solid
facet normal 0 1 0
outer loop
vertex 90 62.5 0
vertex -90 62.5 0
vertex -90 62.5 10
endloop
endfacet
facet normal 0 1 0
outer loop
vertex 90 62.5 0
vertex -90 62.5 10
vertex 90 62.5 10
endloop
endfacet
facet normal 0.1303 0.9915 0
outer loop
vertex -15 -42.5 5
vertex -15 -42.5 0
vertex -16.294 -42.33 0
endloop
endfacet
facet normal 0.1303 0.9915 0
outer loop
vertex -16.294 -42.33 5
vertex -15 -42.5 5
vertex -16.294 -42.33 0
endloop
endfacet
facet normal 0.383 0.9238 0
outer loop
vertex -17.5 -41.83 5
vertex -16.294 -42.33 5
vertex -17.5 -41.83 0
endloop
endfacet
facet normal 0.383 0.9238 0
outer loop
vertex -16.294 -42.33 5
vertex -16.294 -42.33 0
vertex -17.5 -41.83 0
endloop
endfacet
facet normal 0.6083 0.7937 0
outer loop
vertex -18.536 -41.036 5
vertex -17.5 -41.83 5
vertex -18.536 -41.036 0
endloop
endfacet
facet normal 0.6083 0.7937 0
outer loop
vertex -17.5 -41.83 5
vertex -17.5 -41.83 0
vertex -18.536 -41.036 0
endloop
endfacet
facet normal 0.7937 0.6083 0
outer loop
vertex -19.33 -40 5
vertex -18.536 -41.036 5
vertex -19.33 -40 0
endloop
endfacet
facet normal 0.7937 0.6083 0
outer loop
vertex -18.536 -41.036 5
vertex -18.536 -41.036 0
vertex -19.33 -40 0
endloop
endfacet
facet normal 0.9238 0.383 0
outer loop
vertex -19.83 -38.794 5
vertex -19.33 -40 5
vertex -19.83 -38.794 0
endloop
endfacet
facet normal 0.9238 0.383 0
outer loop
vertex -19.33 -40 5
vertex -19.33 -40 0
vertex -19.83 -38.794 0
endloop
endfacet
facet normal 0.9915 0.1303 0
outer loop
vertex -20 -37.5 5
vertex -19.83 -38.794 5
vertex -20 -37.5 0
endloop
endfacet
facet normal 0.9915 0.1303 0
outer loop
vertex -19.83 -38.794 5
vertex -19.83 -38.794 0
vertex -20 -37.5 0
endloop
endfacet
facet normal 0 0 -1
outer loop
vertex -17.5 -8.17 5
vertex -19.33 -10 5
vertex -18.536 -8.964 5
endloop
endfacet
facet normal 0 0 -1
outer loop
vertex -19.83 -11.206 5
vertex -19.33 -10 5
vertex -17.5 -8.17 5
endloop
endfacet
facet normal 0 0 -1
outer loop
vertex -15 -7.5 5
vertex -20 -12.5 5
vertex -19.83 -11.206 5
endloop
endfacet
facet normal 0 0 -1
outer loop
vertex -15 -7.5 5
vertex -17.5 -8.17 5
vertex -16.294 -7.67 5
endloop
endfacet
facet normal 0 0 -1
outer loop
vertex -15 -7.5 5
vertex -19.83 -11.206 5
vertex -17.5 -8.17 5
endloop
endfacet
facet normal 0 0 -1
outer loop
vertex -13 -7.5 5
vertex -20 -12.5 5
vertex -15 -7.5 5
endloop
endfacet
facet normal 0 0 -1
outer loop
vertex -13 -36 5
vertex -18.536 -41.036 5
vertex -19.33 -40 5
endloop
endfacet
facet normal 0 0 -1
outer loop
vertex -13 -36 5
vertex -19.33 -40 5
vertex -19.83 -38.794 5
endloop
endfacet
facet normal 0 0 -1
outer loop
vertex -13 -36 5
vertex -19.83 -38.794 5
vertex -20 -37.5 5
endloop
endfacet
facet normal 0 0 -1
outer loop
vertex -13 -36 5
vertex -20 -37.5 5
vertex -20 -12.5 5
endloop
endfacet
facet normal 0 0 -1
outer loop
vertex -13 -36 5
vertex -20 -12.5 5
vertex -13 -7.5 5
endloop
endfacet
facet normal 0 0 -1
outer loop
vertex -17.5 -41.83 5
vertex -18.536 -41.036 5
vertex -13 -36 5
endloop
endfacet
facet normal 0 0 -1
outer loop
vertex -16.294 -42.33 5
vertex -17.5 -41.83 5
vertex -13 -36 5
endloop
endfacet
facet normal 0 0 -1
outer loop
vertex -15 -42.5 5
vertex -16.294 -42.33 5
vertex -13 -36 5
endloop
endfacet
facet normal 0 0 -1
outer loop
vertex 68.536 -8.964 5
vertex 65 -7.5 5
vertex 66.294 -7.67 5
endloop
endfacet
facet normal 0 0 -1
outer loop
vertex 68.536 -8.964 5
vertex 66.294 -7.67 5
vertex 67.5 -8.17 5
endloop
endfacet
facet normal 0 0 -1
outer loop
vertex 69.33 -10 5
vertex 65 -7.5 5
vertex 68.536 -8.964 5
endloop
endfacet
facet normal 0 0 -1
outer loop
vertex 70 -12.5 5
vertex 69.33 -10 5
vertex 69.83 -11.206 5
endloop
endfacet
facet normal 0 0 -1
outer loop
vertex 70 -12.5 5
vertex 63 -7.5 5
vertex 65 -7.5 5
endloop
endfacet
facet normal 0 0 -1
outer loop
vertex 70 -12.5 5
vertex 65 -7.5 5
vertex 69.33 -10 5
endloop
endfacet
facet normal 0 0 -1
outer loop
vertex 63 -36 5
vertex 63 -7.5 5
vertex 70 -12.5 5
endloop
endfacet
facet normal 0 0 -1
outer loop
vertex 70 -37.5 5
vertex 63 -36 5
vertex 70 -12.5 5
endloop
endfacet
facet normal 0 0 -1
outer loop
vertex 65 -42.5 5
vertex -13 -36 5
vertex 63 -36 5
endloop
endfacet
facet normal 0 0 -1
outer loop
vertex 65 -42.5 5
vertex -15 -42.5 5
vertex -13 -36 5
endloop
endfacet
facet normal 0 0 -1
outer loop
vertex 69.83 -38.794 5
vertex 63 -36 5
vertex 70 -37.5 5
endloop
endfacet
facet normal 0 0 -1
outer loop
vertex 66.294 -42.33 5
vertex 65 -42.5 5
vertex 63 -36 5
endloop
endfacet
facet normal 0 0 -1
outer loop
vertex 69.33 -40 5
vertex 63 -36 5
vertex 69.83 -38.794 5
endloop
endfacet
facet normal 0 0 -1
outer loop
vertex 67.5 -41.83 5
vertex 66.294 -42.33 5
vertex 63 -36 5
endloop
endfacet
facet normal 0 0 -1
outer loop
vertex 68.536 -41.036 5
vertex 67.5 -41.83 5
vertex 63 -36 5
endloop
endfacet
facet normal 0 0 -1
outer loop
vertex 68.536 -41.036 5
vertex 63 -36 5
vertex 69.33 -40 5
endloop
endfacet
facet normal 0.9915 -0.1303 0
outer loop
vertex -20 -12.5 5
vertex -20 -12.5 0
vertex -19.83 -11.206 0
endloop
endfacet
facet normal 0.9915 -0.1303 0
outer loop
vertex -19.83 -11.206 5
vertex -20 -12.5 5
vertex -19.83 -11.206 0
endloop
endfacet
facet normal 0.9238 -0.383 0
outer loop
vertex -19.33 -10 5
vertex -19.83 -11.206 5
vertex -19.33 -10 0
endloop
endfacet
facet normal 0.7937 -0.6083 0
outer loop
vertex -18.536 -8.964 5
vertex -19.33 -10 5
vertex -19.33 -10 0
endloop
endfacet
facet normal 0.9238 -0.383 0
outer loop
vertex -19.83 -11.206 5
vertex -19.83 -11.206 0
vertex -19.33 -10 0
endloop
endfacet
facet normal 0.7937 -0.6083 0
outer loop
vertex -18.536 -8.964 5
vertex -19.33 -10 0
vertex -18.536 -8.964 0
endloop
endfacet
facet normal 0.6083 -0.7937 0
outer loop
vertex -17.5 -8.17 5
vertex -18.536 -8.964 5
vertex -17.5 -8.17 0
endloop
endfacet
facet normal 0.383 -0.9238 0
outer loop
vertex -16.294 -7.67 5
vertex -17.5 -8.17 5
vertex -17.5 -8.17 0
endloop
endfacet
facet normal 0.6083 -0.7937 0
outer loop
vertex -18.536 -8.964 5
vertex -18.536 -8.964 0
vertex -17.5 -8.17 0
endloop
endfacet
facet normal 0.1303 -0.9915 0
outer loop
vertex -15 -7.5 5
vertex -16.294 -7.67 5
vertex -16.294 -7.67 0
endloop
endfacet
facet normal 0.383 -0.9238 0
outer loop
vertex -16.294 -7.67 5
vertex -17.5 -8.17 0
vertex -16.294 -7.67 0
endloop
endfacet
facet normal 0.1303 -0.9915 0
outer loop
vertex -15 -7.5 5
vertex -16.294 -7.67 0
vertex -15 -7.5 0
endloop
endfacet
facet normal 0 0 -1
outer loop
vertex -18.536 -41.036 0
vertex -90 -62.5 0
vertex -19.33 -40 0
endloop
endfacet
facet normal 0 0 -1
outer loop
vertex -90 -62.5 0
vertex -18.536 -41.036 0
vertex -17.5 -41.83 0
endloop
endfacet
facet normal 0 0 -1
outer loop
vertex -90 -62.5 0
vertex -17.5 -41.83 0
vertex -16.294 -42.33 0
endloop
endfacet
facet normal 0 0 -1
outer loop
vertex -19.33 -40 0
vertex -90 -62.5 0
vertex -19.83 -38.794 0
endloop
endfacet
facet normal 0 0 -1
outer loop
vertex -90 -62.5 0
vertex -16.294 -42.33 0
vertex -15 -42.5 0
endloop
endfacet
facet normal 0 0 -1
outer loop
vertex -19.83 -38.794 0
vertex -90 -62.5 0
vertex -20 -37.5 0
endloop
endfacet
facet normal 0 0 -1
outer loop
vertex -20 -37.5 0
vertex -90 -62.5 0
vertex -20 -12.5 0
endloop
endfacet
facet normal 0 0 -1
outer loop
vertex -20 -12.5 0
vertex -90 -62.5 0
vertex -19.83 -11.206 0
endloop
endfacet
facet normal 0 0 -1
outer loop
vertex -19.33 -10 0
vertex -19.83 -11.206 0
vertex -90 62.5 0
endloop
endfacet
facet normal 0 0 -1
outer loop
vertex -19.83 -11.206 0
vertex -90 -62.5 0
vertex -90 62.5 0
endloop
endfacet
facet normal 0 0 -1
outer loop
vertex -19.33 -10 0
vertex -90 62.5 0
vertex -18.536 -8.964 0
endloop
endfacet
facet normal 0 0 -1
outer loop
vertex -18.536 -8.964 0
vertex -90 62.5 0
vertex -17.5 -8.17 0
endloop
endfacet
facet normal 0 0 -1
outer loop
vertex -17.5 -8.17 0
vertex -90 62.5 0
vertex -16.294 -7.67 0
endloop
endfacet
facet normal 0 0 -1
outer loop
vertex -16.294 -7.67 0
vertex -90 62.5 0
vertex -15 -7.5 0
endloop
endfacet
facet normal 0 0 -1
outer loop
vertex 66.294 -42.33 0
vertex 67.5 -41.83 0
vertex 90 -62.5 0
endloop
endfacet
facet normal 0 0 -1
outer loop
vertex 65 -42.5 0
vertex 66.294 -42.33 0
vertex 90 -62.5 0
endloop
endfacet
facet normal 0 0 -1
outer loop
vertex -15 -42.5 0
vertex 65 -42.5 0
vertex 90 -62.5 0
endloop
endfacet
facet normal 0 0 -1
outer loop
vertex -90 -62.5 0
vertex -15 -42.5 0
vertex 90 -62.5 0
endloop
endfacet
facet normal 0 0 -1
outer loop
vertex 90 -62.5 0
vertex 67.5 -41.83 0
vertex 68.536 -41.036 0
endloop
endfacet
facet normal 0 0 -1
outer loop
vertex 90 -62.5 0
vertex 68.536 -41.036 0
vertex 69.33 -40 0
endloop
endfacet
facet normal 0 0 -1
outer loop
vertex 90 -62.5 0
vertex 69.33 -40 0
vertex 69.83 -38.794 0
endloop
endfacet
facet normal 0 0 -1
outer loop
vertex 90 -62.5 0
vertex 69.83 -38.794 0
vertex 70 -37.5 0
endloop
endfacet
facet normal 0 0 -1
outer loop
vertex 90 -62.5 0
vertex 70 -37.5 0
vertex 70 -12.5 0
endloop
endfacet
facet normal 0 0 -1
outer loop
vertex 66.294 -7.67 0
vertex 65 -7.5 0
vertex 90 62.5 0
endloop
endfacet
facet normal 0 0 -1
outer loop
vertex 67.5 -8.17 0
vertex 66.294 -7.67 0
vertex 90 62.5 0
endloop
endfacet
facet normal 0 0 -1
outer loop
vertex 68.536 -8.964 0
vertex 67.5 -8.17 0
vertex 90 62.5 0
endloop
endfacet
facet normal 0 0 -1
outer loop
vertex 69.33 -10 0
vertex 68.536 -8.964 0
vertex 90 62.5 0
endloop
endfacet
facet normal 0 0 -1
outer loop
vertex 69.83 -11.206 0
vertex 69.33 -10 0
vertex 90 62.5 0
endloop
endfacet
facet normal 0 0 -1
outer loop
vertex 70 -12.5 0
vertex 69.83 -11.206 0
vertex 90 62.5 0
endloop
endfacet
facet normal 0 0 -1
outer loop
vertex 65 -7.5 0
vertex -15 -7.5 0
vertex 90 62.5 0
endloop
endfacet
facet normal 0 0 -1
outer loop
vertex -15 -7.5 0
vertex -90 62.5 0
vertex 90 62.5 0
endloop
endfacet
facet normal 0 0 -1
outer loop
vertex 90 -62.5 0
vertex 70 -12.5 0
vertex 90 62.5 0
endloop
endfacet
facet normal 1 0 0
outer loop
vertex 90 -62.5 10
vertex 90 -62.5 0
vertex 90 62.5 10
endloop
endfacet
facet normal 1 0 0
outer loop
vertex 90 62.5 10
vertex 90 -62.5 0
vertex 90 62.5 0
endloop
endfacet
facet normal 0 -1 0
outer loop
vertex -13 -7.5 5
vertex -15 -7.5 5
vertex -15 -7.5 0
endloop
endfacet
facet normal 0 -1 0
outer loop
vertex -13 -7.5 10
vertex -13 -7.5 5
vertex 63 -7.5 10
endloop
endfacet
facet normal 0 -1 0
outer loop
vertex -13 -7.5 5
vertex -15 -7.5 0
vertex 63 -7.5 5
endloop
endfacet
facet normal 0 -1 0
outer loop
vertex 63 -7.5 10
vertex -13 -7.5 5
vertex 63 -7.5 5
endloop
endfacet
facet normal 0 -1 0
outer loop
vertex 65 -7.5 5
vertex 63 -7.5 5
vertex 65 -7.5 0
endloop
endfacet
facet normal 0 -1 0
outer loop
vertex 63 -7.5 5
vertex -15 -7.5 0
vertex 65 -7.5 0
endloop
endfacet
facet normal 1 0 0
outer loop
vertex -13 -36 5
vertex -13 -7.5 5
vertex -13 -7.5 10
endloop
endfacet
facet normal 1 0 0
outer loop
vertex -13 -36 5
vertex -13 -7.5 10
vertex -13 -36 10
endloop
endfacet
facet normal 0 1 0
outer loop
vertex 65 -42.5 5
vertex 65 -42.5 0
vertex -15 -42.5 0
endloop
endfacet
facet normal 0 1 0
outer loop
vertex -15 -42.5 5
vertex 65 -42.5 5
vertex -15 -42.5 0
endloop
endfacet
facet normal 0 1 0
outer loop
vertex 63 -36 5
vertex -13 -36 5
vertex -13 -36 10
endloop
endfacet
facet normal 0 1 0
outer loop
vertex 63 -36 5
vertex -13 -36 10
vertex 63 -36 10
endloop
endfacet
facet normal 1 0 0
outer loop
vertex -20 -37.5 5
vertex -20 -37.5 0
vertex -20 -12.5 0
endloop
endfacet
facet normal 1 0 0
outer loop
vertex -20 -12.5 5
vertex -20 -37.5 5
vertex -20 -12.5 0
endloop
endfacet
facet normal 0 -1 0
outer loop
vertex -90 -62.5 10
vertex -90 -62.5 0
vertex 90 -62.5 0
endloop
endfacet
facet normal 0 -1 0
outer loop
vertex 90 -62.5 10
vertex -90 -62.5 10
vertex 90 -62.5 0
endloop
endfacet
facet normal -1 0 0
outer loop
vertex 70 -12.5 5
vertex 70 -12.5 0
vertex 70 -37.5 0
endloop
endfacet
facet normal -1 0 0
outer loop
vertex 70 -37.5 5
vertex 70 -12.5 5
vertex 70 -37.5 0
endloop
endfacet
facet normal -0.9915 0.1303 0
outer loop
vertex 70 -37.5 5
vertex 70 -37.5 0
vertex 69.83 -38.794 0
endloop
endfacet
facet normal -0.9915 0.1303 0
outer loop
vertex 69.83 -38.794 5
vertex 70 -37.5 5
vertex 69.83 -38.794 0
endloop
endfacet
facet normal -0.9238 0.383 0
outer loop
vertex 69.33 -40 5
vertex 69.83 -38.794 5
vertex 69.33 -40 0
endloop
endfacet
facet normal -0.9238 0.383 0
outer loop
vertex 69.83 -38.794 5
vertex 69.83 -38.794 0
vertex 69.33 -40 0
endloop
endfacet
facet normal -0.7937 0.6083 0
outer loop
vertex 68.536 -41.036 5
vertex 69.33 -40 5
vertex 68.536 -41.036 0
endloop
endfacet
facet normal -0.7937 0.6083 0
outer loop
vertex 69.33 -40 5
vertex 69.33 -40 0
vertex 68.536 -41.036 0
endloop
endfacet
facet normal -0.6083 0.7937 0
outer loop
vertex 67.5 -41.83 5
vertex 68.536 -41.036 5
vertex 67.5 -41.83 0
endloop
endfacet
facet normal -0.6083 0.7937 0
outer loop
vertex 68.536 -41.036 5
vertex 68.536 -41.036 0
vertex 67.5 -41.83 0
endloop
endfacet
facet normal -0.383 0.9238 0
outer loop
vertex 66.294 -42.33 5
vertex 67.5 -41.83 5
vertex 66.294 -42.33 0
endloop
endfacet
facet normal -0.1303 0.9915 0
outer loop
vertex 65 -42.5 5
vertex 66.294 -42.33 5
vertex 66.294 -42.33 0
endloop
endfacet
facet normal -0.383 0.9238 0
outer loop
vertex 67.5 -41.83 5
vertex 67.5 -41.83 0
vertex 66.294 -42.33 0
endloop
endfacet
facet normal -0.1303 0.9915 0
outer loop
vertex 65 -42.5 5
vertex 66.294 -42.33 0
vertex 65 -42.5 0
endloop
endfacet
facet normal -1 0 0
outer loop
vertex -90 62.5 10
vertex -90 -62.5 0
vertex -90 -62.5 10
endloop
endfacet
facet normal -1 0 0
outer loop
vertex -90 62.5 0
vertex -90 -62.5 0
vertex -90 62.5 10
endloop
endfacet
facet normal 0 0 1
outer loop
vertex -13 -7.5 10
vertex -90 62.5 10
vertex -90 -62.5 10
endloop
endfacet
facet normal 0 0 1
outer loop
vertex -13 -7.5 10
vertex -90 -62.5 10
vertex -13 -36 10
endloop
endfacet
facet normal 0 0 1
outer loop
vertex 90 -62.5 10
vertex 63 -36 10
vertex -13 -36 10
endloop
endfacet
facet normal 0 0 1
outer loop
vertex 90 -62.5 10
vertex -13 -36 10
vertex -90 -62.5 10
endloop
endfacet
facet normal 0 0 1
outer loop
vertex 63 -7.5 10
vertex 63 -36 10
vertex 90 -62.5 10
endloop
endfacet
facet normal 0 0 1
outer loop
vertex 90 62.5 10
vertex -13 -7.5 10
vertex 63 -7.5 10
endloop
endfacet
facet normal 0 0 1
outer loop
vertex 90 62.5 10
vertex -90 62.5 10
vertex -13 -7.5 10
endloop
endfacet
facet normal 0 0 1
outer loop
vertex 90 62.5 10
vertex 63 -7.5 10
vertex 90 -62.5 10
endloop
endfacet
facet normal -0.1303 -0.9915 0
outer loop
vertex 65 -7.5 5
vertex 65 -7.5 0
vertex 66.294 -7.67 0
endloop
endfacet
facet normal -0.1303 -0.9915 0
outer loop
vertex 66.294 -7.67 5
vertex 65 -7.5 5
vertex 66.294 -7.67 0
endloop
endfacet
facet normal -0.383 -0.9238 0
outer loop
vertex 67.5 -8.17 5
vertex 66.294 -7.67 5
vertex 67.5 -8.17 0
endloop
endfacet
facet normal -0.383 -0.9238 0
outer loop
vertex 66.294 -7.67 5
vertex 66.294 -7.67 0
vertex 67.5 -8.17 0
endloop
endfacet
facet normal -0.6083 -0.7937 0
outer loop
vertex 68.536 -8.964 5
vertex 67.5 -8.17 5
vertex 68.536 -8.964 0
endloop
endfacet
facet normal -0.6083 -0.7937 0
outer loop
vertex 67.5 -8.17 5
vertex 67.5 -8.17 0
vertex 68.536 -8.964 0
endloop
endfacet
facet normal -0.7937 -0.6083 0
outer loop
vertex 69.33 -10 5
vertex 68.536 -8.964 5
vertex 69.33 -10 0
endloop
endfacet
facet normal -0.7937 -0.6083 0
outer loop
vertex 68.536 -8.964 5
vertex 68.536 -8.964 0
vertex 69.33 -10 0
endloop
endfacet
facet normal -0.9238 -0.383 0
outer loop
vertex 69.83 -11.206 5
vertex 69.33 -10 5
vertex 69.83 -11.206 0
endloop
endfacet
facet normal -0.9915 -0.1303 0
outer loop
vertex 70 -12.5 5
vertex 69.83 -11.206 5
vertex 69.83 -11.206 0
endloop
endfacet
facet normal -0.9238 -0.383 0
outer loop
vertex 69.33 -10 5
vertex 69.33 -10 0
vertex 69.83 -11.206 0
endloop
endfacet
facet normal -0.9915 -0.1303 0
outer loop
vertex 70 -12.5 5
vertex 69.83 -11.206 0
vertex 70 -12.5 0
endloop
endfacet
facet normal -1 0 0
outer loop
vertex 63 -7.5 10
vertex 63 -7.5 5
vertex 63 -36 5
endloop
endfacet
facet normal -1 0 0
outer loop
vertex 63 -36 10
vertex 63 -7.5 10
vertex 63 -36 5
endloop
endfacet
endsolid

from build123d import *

# Parameters (mm, degrees)
F0_W     = 180
F0_H     = 125
F1_DEPTH = 10
F3_DEPTH = 5
F4_W     = 76
F4_H     = 28.5
F5_DEPTH = 5.001


with BuildPart() as f1:
    # F0 (on Top) → F1 (new body)
    with BuildSketch(Plane.XY):
        Rectangle(F0_W, F0_H)
    extrude(amount=F1_DEPTH)

    # F2 (on face) → F3 (cut)
    with BuildSketch(Plane(origin=(0, 0, 0), x_dir=(1, 0, 0), z_dir=(0, 0, -1))):
        with BuildLine():
            Line((70, 12.5), (70, 37.5))
            ThreePointArc((70, 37.5), (68.535534, 41.035534), (65, 42.5))
            Line((65, 42.5), (-15, 42.5))
            ThreePointArc((-15, 42.5), (-18.535534, 41.035534), (-20, 37.5))
            Line((-20, 37.5), (-20, 12.5))
            ThreePointArc((-20, 12.5), (-18.535534, 8.964466), (-15, 7.5))
            Line((-15, 7.5), (65, 7.5))
            ThreePointArc((65, 7.5), (68.535534, 8.964466), (70, 12.5))
        make_face()
    extrude(amount=-F3_DEPTH, mode=Mode.SUBTRACT)

    # F4 (on face) → F5 (cut, through all)
    with BuildSketch(Plane(origin=(0, 0, 5), x_dir=(1, 0, 0), z_dir=(0, 0, -1))):
        with Locations((25, 21.75)):
            Rectangle(F4_W, F4_H)
    extrude(amount=-F5_DEPTH, mode=Mode.SUBTRACT)


solid = f1.part
